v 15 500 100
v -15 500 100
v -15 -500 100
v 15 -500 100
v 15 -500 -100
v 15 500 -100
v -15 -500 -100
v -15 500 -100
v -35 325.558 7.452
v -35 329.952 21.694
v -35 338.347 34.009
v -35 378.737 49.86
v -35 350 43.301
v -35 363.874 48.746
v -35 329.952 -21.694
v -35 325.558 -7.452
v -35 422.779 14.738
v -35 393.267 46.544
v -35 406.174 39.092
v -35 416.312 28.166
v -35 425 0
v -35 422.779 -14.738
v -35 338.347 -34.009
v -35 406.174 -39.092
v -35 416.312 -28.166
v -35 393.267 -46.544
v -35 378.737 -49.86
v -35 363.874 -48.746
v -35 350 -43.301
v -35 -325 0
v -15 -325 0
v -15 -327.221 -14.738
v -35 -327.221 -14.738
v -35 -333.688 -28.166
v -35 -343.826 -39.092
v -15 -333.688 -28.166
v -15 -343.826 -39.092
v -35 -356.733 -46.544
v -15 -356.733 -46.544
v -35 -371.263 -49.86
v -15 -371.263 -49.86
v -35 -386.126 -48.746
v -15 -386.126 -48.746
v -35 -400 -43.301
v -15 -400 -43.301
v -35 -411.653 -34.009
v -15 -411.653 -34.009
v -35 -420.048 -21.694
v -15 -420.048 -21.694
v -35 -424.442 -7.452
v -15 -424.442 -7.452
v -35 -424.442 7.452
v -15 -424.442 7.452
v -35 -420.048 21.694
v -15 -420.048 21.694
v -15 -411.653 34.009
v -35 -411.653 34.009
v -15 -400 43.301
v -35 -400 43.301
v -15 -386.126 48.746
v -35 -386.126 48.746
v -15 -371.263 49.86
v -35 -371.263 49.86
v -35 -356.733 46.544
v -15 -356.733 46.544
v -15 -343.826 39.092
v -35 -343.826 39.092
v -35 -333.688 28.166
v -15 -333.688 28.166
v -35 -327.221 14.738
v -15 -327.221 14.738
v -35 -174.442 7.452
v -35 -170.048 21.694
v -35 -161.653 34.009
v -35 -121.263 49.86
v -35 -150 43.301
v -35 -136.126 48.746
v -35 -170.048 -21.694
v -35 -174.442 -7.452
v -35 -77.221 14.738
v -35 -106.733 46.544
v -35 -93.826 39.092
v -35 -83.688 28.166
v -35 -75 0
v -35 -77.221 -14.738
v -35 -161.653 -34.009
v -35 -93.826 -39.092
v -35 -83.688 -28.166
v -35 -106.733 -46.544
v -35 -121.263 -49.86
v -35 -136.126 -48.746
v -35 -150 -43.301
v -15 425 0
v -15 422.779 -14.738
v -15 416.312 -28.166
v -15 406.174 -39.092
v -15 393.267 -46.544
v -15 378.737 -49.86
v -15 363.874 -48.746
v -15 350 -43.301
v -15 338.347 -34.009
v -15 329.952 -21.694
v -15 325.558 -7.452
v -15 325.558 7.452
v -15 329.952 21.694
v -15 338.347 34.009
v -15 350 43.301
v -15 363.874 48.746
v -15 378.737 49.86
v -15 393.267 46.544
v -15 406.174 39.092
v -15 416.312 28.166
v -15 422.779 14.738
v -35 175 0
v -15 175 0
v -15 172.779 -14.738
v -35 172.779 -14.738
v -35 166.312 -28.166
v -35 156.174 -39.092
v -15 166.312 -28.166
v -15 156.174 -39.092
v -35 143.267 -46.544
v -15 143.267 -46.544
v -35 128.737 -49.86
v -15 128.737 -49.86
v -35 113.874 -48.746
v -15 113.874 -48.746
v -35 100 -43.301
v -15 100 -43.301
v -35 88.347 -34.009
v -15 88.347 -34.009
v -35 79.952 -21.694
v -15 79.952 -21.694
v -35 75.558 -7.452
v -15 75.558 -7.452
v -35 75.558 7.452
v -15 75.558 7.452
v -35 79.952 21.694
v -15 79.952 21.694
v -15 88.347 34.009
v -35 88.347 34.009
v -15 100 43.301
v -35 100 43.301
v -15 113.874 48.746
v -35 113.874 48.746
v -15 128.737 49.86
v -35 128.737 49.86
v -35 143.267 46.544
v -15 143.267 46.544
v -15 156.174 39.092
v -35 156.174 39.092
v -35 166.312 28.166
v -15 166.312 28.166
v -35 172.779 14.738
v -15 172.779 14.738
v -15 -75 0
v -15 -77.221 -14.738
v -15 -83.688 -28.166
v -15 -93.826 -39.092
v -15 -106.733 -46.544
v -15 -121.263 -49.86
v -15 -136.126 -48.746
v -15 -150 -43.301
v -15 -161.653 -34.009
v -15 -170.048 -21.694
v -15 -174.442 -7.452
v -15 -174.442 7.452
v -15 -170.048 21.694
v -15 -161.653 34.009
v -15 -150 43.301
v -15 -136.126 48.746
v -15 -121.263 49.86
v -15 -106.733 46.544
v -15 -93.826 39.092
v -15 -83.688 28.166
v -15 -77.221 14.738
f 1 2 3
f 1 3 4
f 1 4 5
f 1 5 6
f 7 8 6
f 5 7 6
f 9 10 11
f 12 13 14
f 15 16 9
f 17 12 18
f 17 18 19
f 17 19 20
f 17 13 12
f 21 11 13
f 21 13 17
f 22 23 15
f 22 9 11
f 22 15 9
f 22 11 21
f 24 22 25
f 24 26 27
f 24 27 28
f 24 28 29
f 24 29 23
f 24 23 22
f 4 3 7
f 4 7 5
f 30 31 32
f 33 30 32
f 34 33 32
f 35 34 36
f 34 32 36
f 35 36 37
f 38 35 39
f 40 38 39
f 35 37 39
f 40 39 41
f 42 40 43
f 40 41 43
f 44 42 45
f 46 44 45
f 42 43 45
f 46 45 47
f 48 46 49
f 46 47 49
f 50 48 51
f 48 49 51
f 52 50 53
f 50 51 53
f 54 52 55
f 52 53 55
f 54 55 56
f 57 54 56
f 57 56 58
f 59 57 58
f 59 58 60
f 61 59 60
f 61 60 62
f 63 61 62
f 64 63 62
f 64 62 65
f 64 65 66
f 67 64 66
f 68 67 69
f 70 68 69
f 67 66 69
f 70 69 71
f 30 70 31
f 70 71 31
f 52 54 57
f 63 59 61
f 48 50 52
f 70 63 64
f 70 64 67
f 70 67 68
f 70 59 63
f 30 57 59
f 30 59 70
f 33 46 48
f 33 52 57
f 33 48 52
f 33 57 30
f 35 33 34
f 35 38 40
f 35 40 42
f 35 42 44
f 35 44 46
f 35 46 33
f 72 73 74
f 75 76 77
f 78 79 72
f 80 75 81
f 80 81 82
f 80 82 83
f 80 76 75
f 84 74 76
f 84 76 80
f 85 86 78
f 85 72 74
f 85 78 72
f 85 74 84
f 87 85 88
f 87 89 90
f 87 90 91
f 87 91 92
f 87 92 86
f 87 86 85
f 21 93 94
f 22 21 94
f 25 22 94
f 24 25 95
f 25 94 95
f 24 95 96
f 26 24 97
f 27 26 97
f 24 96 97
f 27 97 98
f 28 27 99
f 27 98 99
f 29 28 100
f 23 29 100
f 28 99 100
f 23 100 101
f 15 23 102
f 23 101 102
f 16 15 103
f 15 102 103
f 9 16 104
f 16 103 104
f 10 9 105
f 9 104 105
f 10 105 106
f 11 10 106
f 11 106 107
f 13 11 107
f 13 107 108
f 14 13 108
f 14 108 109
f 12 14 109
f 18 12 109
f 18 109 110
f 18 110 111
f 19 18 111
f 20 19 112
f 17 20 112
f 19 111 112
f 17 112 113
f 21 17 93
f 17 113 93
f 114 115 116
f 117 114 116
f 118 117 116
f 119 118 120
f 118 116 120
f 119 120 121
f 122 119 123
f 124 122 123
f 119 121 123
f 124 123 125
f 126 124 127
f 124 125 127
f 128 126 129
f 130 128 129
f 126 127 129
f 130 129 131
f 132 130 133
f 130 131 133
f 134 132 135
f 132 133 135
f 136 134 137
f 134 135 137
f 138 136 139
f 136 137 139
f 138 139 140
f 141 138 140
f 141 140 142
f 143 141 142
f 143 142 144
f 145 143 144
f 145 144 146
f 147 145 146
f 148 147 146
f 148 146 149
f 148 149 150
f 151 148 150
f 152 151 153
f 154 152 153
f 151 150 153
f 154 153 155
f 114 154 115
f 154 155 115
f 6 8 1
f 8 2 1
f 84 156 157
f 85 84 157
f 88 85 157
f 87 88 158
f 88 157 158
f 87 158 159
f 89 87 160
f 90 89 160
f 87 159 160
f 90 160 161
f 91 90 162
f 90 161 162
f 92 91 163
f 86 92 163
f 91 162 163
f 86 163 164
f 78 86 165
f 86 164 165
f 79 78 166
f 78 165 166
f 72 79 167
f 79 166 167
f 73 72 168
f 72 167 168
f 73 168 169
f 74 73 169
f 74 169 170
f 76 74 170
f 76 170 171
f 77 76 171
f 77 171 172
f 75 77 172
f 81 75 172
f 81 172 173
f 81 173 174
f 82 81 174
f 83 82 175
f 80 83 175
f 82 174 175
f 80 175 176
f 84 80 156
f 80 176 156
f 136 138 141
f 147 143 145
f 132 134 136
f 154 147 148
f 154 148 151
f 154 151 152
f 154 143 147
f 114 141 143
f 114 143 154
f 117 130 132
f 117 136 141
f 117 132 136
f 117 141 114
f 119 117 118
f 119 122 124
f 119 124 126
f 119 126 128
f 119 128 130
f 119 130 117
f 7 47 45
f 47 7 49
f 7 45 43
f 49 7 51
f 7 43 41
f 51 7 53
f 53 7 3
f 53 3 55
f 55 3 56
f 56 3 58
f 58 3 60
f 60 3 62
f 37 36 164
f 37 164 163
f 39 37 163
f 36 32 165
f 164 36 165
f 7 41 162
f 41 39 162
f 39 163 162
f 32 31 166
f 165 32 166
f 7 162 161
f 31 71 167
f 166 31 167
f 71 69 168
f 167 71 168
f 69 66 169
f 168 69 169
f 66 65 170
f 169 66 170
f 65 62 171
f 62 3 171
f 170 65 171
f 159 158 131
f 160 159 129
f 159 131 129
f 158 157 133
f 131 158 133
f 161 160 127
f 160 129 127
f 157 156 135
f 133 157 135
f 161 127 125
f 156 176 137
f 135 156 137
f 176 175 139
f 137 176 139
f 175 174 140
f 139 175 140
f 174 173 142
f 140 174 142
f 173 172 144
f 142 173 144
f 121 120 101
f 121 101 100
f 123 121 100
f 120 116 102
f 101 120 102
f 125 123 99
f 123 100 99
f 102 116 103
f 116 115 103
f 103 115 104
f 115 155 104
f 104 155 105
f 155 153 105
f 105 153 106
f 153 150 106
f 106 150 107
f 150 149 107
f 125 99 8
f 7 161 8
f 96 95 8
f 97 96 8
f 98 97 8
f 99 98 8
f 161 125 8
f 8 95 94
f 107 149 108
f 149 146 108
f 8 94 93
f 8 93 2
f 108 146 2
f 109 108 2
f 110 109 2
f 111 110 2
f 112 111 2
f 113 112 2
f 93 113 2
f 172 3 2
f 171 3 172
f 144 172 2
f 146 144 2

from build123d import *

# Parameters (mm, degrees)
SKETCH_3_W             = 30
SKETCH_3_H             = 1000
EXTRUDE_1_DEPTH        = 100
SKETCH_6_R             = 50
EXTRUDE_2_DEPTH        = 20
PATTERN_LINEAR_1_COUNT = 4
PATTERN_LINEAR_1_PITCH = 250


with BuildPart() as part:
    # 草图3 → 凸台-拉伸1 (new, symmetric)
    with BuildSketch(Plane.XY):
        Rectangle(SKETCH_3_W, SKETCH_3_H)
    extrude(amount=EXTRUDE_1_DEPTH, both=True)

    # 草图6 → 凸台-拉伸2 (add)
    with BuildSketch(Plane.ZY.offset(15)):
        with Locations(Location((0, 375, 0), (0, 0, 90))):
            Circle(SKETCH_6_R)
    extrude_2 = extrude(amount=EXTRUDE_2_DEPTH)

    # 阵列(线性)1: 凸台-拉伸2 ×4
    with Locations(*[(0, -i * PATTERN_LINEAR_1_PITCH, 0) for i in range(1, PATTERN_LINEAR_1_COUNT)]):
        add(extrude_2)


solid = part.part
